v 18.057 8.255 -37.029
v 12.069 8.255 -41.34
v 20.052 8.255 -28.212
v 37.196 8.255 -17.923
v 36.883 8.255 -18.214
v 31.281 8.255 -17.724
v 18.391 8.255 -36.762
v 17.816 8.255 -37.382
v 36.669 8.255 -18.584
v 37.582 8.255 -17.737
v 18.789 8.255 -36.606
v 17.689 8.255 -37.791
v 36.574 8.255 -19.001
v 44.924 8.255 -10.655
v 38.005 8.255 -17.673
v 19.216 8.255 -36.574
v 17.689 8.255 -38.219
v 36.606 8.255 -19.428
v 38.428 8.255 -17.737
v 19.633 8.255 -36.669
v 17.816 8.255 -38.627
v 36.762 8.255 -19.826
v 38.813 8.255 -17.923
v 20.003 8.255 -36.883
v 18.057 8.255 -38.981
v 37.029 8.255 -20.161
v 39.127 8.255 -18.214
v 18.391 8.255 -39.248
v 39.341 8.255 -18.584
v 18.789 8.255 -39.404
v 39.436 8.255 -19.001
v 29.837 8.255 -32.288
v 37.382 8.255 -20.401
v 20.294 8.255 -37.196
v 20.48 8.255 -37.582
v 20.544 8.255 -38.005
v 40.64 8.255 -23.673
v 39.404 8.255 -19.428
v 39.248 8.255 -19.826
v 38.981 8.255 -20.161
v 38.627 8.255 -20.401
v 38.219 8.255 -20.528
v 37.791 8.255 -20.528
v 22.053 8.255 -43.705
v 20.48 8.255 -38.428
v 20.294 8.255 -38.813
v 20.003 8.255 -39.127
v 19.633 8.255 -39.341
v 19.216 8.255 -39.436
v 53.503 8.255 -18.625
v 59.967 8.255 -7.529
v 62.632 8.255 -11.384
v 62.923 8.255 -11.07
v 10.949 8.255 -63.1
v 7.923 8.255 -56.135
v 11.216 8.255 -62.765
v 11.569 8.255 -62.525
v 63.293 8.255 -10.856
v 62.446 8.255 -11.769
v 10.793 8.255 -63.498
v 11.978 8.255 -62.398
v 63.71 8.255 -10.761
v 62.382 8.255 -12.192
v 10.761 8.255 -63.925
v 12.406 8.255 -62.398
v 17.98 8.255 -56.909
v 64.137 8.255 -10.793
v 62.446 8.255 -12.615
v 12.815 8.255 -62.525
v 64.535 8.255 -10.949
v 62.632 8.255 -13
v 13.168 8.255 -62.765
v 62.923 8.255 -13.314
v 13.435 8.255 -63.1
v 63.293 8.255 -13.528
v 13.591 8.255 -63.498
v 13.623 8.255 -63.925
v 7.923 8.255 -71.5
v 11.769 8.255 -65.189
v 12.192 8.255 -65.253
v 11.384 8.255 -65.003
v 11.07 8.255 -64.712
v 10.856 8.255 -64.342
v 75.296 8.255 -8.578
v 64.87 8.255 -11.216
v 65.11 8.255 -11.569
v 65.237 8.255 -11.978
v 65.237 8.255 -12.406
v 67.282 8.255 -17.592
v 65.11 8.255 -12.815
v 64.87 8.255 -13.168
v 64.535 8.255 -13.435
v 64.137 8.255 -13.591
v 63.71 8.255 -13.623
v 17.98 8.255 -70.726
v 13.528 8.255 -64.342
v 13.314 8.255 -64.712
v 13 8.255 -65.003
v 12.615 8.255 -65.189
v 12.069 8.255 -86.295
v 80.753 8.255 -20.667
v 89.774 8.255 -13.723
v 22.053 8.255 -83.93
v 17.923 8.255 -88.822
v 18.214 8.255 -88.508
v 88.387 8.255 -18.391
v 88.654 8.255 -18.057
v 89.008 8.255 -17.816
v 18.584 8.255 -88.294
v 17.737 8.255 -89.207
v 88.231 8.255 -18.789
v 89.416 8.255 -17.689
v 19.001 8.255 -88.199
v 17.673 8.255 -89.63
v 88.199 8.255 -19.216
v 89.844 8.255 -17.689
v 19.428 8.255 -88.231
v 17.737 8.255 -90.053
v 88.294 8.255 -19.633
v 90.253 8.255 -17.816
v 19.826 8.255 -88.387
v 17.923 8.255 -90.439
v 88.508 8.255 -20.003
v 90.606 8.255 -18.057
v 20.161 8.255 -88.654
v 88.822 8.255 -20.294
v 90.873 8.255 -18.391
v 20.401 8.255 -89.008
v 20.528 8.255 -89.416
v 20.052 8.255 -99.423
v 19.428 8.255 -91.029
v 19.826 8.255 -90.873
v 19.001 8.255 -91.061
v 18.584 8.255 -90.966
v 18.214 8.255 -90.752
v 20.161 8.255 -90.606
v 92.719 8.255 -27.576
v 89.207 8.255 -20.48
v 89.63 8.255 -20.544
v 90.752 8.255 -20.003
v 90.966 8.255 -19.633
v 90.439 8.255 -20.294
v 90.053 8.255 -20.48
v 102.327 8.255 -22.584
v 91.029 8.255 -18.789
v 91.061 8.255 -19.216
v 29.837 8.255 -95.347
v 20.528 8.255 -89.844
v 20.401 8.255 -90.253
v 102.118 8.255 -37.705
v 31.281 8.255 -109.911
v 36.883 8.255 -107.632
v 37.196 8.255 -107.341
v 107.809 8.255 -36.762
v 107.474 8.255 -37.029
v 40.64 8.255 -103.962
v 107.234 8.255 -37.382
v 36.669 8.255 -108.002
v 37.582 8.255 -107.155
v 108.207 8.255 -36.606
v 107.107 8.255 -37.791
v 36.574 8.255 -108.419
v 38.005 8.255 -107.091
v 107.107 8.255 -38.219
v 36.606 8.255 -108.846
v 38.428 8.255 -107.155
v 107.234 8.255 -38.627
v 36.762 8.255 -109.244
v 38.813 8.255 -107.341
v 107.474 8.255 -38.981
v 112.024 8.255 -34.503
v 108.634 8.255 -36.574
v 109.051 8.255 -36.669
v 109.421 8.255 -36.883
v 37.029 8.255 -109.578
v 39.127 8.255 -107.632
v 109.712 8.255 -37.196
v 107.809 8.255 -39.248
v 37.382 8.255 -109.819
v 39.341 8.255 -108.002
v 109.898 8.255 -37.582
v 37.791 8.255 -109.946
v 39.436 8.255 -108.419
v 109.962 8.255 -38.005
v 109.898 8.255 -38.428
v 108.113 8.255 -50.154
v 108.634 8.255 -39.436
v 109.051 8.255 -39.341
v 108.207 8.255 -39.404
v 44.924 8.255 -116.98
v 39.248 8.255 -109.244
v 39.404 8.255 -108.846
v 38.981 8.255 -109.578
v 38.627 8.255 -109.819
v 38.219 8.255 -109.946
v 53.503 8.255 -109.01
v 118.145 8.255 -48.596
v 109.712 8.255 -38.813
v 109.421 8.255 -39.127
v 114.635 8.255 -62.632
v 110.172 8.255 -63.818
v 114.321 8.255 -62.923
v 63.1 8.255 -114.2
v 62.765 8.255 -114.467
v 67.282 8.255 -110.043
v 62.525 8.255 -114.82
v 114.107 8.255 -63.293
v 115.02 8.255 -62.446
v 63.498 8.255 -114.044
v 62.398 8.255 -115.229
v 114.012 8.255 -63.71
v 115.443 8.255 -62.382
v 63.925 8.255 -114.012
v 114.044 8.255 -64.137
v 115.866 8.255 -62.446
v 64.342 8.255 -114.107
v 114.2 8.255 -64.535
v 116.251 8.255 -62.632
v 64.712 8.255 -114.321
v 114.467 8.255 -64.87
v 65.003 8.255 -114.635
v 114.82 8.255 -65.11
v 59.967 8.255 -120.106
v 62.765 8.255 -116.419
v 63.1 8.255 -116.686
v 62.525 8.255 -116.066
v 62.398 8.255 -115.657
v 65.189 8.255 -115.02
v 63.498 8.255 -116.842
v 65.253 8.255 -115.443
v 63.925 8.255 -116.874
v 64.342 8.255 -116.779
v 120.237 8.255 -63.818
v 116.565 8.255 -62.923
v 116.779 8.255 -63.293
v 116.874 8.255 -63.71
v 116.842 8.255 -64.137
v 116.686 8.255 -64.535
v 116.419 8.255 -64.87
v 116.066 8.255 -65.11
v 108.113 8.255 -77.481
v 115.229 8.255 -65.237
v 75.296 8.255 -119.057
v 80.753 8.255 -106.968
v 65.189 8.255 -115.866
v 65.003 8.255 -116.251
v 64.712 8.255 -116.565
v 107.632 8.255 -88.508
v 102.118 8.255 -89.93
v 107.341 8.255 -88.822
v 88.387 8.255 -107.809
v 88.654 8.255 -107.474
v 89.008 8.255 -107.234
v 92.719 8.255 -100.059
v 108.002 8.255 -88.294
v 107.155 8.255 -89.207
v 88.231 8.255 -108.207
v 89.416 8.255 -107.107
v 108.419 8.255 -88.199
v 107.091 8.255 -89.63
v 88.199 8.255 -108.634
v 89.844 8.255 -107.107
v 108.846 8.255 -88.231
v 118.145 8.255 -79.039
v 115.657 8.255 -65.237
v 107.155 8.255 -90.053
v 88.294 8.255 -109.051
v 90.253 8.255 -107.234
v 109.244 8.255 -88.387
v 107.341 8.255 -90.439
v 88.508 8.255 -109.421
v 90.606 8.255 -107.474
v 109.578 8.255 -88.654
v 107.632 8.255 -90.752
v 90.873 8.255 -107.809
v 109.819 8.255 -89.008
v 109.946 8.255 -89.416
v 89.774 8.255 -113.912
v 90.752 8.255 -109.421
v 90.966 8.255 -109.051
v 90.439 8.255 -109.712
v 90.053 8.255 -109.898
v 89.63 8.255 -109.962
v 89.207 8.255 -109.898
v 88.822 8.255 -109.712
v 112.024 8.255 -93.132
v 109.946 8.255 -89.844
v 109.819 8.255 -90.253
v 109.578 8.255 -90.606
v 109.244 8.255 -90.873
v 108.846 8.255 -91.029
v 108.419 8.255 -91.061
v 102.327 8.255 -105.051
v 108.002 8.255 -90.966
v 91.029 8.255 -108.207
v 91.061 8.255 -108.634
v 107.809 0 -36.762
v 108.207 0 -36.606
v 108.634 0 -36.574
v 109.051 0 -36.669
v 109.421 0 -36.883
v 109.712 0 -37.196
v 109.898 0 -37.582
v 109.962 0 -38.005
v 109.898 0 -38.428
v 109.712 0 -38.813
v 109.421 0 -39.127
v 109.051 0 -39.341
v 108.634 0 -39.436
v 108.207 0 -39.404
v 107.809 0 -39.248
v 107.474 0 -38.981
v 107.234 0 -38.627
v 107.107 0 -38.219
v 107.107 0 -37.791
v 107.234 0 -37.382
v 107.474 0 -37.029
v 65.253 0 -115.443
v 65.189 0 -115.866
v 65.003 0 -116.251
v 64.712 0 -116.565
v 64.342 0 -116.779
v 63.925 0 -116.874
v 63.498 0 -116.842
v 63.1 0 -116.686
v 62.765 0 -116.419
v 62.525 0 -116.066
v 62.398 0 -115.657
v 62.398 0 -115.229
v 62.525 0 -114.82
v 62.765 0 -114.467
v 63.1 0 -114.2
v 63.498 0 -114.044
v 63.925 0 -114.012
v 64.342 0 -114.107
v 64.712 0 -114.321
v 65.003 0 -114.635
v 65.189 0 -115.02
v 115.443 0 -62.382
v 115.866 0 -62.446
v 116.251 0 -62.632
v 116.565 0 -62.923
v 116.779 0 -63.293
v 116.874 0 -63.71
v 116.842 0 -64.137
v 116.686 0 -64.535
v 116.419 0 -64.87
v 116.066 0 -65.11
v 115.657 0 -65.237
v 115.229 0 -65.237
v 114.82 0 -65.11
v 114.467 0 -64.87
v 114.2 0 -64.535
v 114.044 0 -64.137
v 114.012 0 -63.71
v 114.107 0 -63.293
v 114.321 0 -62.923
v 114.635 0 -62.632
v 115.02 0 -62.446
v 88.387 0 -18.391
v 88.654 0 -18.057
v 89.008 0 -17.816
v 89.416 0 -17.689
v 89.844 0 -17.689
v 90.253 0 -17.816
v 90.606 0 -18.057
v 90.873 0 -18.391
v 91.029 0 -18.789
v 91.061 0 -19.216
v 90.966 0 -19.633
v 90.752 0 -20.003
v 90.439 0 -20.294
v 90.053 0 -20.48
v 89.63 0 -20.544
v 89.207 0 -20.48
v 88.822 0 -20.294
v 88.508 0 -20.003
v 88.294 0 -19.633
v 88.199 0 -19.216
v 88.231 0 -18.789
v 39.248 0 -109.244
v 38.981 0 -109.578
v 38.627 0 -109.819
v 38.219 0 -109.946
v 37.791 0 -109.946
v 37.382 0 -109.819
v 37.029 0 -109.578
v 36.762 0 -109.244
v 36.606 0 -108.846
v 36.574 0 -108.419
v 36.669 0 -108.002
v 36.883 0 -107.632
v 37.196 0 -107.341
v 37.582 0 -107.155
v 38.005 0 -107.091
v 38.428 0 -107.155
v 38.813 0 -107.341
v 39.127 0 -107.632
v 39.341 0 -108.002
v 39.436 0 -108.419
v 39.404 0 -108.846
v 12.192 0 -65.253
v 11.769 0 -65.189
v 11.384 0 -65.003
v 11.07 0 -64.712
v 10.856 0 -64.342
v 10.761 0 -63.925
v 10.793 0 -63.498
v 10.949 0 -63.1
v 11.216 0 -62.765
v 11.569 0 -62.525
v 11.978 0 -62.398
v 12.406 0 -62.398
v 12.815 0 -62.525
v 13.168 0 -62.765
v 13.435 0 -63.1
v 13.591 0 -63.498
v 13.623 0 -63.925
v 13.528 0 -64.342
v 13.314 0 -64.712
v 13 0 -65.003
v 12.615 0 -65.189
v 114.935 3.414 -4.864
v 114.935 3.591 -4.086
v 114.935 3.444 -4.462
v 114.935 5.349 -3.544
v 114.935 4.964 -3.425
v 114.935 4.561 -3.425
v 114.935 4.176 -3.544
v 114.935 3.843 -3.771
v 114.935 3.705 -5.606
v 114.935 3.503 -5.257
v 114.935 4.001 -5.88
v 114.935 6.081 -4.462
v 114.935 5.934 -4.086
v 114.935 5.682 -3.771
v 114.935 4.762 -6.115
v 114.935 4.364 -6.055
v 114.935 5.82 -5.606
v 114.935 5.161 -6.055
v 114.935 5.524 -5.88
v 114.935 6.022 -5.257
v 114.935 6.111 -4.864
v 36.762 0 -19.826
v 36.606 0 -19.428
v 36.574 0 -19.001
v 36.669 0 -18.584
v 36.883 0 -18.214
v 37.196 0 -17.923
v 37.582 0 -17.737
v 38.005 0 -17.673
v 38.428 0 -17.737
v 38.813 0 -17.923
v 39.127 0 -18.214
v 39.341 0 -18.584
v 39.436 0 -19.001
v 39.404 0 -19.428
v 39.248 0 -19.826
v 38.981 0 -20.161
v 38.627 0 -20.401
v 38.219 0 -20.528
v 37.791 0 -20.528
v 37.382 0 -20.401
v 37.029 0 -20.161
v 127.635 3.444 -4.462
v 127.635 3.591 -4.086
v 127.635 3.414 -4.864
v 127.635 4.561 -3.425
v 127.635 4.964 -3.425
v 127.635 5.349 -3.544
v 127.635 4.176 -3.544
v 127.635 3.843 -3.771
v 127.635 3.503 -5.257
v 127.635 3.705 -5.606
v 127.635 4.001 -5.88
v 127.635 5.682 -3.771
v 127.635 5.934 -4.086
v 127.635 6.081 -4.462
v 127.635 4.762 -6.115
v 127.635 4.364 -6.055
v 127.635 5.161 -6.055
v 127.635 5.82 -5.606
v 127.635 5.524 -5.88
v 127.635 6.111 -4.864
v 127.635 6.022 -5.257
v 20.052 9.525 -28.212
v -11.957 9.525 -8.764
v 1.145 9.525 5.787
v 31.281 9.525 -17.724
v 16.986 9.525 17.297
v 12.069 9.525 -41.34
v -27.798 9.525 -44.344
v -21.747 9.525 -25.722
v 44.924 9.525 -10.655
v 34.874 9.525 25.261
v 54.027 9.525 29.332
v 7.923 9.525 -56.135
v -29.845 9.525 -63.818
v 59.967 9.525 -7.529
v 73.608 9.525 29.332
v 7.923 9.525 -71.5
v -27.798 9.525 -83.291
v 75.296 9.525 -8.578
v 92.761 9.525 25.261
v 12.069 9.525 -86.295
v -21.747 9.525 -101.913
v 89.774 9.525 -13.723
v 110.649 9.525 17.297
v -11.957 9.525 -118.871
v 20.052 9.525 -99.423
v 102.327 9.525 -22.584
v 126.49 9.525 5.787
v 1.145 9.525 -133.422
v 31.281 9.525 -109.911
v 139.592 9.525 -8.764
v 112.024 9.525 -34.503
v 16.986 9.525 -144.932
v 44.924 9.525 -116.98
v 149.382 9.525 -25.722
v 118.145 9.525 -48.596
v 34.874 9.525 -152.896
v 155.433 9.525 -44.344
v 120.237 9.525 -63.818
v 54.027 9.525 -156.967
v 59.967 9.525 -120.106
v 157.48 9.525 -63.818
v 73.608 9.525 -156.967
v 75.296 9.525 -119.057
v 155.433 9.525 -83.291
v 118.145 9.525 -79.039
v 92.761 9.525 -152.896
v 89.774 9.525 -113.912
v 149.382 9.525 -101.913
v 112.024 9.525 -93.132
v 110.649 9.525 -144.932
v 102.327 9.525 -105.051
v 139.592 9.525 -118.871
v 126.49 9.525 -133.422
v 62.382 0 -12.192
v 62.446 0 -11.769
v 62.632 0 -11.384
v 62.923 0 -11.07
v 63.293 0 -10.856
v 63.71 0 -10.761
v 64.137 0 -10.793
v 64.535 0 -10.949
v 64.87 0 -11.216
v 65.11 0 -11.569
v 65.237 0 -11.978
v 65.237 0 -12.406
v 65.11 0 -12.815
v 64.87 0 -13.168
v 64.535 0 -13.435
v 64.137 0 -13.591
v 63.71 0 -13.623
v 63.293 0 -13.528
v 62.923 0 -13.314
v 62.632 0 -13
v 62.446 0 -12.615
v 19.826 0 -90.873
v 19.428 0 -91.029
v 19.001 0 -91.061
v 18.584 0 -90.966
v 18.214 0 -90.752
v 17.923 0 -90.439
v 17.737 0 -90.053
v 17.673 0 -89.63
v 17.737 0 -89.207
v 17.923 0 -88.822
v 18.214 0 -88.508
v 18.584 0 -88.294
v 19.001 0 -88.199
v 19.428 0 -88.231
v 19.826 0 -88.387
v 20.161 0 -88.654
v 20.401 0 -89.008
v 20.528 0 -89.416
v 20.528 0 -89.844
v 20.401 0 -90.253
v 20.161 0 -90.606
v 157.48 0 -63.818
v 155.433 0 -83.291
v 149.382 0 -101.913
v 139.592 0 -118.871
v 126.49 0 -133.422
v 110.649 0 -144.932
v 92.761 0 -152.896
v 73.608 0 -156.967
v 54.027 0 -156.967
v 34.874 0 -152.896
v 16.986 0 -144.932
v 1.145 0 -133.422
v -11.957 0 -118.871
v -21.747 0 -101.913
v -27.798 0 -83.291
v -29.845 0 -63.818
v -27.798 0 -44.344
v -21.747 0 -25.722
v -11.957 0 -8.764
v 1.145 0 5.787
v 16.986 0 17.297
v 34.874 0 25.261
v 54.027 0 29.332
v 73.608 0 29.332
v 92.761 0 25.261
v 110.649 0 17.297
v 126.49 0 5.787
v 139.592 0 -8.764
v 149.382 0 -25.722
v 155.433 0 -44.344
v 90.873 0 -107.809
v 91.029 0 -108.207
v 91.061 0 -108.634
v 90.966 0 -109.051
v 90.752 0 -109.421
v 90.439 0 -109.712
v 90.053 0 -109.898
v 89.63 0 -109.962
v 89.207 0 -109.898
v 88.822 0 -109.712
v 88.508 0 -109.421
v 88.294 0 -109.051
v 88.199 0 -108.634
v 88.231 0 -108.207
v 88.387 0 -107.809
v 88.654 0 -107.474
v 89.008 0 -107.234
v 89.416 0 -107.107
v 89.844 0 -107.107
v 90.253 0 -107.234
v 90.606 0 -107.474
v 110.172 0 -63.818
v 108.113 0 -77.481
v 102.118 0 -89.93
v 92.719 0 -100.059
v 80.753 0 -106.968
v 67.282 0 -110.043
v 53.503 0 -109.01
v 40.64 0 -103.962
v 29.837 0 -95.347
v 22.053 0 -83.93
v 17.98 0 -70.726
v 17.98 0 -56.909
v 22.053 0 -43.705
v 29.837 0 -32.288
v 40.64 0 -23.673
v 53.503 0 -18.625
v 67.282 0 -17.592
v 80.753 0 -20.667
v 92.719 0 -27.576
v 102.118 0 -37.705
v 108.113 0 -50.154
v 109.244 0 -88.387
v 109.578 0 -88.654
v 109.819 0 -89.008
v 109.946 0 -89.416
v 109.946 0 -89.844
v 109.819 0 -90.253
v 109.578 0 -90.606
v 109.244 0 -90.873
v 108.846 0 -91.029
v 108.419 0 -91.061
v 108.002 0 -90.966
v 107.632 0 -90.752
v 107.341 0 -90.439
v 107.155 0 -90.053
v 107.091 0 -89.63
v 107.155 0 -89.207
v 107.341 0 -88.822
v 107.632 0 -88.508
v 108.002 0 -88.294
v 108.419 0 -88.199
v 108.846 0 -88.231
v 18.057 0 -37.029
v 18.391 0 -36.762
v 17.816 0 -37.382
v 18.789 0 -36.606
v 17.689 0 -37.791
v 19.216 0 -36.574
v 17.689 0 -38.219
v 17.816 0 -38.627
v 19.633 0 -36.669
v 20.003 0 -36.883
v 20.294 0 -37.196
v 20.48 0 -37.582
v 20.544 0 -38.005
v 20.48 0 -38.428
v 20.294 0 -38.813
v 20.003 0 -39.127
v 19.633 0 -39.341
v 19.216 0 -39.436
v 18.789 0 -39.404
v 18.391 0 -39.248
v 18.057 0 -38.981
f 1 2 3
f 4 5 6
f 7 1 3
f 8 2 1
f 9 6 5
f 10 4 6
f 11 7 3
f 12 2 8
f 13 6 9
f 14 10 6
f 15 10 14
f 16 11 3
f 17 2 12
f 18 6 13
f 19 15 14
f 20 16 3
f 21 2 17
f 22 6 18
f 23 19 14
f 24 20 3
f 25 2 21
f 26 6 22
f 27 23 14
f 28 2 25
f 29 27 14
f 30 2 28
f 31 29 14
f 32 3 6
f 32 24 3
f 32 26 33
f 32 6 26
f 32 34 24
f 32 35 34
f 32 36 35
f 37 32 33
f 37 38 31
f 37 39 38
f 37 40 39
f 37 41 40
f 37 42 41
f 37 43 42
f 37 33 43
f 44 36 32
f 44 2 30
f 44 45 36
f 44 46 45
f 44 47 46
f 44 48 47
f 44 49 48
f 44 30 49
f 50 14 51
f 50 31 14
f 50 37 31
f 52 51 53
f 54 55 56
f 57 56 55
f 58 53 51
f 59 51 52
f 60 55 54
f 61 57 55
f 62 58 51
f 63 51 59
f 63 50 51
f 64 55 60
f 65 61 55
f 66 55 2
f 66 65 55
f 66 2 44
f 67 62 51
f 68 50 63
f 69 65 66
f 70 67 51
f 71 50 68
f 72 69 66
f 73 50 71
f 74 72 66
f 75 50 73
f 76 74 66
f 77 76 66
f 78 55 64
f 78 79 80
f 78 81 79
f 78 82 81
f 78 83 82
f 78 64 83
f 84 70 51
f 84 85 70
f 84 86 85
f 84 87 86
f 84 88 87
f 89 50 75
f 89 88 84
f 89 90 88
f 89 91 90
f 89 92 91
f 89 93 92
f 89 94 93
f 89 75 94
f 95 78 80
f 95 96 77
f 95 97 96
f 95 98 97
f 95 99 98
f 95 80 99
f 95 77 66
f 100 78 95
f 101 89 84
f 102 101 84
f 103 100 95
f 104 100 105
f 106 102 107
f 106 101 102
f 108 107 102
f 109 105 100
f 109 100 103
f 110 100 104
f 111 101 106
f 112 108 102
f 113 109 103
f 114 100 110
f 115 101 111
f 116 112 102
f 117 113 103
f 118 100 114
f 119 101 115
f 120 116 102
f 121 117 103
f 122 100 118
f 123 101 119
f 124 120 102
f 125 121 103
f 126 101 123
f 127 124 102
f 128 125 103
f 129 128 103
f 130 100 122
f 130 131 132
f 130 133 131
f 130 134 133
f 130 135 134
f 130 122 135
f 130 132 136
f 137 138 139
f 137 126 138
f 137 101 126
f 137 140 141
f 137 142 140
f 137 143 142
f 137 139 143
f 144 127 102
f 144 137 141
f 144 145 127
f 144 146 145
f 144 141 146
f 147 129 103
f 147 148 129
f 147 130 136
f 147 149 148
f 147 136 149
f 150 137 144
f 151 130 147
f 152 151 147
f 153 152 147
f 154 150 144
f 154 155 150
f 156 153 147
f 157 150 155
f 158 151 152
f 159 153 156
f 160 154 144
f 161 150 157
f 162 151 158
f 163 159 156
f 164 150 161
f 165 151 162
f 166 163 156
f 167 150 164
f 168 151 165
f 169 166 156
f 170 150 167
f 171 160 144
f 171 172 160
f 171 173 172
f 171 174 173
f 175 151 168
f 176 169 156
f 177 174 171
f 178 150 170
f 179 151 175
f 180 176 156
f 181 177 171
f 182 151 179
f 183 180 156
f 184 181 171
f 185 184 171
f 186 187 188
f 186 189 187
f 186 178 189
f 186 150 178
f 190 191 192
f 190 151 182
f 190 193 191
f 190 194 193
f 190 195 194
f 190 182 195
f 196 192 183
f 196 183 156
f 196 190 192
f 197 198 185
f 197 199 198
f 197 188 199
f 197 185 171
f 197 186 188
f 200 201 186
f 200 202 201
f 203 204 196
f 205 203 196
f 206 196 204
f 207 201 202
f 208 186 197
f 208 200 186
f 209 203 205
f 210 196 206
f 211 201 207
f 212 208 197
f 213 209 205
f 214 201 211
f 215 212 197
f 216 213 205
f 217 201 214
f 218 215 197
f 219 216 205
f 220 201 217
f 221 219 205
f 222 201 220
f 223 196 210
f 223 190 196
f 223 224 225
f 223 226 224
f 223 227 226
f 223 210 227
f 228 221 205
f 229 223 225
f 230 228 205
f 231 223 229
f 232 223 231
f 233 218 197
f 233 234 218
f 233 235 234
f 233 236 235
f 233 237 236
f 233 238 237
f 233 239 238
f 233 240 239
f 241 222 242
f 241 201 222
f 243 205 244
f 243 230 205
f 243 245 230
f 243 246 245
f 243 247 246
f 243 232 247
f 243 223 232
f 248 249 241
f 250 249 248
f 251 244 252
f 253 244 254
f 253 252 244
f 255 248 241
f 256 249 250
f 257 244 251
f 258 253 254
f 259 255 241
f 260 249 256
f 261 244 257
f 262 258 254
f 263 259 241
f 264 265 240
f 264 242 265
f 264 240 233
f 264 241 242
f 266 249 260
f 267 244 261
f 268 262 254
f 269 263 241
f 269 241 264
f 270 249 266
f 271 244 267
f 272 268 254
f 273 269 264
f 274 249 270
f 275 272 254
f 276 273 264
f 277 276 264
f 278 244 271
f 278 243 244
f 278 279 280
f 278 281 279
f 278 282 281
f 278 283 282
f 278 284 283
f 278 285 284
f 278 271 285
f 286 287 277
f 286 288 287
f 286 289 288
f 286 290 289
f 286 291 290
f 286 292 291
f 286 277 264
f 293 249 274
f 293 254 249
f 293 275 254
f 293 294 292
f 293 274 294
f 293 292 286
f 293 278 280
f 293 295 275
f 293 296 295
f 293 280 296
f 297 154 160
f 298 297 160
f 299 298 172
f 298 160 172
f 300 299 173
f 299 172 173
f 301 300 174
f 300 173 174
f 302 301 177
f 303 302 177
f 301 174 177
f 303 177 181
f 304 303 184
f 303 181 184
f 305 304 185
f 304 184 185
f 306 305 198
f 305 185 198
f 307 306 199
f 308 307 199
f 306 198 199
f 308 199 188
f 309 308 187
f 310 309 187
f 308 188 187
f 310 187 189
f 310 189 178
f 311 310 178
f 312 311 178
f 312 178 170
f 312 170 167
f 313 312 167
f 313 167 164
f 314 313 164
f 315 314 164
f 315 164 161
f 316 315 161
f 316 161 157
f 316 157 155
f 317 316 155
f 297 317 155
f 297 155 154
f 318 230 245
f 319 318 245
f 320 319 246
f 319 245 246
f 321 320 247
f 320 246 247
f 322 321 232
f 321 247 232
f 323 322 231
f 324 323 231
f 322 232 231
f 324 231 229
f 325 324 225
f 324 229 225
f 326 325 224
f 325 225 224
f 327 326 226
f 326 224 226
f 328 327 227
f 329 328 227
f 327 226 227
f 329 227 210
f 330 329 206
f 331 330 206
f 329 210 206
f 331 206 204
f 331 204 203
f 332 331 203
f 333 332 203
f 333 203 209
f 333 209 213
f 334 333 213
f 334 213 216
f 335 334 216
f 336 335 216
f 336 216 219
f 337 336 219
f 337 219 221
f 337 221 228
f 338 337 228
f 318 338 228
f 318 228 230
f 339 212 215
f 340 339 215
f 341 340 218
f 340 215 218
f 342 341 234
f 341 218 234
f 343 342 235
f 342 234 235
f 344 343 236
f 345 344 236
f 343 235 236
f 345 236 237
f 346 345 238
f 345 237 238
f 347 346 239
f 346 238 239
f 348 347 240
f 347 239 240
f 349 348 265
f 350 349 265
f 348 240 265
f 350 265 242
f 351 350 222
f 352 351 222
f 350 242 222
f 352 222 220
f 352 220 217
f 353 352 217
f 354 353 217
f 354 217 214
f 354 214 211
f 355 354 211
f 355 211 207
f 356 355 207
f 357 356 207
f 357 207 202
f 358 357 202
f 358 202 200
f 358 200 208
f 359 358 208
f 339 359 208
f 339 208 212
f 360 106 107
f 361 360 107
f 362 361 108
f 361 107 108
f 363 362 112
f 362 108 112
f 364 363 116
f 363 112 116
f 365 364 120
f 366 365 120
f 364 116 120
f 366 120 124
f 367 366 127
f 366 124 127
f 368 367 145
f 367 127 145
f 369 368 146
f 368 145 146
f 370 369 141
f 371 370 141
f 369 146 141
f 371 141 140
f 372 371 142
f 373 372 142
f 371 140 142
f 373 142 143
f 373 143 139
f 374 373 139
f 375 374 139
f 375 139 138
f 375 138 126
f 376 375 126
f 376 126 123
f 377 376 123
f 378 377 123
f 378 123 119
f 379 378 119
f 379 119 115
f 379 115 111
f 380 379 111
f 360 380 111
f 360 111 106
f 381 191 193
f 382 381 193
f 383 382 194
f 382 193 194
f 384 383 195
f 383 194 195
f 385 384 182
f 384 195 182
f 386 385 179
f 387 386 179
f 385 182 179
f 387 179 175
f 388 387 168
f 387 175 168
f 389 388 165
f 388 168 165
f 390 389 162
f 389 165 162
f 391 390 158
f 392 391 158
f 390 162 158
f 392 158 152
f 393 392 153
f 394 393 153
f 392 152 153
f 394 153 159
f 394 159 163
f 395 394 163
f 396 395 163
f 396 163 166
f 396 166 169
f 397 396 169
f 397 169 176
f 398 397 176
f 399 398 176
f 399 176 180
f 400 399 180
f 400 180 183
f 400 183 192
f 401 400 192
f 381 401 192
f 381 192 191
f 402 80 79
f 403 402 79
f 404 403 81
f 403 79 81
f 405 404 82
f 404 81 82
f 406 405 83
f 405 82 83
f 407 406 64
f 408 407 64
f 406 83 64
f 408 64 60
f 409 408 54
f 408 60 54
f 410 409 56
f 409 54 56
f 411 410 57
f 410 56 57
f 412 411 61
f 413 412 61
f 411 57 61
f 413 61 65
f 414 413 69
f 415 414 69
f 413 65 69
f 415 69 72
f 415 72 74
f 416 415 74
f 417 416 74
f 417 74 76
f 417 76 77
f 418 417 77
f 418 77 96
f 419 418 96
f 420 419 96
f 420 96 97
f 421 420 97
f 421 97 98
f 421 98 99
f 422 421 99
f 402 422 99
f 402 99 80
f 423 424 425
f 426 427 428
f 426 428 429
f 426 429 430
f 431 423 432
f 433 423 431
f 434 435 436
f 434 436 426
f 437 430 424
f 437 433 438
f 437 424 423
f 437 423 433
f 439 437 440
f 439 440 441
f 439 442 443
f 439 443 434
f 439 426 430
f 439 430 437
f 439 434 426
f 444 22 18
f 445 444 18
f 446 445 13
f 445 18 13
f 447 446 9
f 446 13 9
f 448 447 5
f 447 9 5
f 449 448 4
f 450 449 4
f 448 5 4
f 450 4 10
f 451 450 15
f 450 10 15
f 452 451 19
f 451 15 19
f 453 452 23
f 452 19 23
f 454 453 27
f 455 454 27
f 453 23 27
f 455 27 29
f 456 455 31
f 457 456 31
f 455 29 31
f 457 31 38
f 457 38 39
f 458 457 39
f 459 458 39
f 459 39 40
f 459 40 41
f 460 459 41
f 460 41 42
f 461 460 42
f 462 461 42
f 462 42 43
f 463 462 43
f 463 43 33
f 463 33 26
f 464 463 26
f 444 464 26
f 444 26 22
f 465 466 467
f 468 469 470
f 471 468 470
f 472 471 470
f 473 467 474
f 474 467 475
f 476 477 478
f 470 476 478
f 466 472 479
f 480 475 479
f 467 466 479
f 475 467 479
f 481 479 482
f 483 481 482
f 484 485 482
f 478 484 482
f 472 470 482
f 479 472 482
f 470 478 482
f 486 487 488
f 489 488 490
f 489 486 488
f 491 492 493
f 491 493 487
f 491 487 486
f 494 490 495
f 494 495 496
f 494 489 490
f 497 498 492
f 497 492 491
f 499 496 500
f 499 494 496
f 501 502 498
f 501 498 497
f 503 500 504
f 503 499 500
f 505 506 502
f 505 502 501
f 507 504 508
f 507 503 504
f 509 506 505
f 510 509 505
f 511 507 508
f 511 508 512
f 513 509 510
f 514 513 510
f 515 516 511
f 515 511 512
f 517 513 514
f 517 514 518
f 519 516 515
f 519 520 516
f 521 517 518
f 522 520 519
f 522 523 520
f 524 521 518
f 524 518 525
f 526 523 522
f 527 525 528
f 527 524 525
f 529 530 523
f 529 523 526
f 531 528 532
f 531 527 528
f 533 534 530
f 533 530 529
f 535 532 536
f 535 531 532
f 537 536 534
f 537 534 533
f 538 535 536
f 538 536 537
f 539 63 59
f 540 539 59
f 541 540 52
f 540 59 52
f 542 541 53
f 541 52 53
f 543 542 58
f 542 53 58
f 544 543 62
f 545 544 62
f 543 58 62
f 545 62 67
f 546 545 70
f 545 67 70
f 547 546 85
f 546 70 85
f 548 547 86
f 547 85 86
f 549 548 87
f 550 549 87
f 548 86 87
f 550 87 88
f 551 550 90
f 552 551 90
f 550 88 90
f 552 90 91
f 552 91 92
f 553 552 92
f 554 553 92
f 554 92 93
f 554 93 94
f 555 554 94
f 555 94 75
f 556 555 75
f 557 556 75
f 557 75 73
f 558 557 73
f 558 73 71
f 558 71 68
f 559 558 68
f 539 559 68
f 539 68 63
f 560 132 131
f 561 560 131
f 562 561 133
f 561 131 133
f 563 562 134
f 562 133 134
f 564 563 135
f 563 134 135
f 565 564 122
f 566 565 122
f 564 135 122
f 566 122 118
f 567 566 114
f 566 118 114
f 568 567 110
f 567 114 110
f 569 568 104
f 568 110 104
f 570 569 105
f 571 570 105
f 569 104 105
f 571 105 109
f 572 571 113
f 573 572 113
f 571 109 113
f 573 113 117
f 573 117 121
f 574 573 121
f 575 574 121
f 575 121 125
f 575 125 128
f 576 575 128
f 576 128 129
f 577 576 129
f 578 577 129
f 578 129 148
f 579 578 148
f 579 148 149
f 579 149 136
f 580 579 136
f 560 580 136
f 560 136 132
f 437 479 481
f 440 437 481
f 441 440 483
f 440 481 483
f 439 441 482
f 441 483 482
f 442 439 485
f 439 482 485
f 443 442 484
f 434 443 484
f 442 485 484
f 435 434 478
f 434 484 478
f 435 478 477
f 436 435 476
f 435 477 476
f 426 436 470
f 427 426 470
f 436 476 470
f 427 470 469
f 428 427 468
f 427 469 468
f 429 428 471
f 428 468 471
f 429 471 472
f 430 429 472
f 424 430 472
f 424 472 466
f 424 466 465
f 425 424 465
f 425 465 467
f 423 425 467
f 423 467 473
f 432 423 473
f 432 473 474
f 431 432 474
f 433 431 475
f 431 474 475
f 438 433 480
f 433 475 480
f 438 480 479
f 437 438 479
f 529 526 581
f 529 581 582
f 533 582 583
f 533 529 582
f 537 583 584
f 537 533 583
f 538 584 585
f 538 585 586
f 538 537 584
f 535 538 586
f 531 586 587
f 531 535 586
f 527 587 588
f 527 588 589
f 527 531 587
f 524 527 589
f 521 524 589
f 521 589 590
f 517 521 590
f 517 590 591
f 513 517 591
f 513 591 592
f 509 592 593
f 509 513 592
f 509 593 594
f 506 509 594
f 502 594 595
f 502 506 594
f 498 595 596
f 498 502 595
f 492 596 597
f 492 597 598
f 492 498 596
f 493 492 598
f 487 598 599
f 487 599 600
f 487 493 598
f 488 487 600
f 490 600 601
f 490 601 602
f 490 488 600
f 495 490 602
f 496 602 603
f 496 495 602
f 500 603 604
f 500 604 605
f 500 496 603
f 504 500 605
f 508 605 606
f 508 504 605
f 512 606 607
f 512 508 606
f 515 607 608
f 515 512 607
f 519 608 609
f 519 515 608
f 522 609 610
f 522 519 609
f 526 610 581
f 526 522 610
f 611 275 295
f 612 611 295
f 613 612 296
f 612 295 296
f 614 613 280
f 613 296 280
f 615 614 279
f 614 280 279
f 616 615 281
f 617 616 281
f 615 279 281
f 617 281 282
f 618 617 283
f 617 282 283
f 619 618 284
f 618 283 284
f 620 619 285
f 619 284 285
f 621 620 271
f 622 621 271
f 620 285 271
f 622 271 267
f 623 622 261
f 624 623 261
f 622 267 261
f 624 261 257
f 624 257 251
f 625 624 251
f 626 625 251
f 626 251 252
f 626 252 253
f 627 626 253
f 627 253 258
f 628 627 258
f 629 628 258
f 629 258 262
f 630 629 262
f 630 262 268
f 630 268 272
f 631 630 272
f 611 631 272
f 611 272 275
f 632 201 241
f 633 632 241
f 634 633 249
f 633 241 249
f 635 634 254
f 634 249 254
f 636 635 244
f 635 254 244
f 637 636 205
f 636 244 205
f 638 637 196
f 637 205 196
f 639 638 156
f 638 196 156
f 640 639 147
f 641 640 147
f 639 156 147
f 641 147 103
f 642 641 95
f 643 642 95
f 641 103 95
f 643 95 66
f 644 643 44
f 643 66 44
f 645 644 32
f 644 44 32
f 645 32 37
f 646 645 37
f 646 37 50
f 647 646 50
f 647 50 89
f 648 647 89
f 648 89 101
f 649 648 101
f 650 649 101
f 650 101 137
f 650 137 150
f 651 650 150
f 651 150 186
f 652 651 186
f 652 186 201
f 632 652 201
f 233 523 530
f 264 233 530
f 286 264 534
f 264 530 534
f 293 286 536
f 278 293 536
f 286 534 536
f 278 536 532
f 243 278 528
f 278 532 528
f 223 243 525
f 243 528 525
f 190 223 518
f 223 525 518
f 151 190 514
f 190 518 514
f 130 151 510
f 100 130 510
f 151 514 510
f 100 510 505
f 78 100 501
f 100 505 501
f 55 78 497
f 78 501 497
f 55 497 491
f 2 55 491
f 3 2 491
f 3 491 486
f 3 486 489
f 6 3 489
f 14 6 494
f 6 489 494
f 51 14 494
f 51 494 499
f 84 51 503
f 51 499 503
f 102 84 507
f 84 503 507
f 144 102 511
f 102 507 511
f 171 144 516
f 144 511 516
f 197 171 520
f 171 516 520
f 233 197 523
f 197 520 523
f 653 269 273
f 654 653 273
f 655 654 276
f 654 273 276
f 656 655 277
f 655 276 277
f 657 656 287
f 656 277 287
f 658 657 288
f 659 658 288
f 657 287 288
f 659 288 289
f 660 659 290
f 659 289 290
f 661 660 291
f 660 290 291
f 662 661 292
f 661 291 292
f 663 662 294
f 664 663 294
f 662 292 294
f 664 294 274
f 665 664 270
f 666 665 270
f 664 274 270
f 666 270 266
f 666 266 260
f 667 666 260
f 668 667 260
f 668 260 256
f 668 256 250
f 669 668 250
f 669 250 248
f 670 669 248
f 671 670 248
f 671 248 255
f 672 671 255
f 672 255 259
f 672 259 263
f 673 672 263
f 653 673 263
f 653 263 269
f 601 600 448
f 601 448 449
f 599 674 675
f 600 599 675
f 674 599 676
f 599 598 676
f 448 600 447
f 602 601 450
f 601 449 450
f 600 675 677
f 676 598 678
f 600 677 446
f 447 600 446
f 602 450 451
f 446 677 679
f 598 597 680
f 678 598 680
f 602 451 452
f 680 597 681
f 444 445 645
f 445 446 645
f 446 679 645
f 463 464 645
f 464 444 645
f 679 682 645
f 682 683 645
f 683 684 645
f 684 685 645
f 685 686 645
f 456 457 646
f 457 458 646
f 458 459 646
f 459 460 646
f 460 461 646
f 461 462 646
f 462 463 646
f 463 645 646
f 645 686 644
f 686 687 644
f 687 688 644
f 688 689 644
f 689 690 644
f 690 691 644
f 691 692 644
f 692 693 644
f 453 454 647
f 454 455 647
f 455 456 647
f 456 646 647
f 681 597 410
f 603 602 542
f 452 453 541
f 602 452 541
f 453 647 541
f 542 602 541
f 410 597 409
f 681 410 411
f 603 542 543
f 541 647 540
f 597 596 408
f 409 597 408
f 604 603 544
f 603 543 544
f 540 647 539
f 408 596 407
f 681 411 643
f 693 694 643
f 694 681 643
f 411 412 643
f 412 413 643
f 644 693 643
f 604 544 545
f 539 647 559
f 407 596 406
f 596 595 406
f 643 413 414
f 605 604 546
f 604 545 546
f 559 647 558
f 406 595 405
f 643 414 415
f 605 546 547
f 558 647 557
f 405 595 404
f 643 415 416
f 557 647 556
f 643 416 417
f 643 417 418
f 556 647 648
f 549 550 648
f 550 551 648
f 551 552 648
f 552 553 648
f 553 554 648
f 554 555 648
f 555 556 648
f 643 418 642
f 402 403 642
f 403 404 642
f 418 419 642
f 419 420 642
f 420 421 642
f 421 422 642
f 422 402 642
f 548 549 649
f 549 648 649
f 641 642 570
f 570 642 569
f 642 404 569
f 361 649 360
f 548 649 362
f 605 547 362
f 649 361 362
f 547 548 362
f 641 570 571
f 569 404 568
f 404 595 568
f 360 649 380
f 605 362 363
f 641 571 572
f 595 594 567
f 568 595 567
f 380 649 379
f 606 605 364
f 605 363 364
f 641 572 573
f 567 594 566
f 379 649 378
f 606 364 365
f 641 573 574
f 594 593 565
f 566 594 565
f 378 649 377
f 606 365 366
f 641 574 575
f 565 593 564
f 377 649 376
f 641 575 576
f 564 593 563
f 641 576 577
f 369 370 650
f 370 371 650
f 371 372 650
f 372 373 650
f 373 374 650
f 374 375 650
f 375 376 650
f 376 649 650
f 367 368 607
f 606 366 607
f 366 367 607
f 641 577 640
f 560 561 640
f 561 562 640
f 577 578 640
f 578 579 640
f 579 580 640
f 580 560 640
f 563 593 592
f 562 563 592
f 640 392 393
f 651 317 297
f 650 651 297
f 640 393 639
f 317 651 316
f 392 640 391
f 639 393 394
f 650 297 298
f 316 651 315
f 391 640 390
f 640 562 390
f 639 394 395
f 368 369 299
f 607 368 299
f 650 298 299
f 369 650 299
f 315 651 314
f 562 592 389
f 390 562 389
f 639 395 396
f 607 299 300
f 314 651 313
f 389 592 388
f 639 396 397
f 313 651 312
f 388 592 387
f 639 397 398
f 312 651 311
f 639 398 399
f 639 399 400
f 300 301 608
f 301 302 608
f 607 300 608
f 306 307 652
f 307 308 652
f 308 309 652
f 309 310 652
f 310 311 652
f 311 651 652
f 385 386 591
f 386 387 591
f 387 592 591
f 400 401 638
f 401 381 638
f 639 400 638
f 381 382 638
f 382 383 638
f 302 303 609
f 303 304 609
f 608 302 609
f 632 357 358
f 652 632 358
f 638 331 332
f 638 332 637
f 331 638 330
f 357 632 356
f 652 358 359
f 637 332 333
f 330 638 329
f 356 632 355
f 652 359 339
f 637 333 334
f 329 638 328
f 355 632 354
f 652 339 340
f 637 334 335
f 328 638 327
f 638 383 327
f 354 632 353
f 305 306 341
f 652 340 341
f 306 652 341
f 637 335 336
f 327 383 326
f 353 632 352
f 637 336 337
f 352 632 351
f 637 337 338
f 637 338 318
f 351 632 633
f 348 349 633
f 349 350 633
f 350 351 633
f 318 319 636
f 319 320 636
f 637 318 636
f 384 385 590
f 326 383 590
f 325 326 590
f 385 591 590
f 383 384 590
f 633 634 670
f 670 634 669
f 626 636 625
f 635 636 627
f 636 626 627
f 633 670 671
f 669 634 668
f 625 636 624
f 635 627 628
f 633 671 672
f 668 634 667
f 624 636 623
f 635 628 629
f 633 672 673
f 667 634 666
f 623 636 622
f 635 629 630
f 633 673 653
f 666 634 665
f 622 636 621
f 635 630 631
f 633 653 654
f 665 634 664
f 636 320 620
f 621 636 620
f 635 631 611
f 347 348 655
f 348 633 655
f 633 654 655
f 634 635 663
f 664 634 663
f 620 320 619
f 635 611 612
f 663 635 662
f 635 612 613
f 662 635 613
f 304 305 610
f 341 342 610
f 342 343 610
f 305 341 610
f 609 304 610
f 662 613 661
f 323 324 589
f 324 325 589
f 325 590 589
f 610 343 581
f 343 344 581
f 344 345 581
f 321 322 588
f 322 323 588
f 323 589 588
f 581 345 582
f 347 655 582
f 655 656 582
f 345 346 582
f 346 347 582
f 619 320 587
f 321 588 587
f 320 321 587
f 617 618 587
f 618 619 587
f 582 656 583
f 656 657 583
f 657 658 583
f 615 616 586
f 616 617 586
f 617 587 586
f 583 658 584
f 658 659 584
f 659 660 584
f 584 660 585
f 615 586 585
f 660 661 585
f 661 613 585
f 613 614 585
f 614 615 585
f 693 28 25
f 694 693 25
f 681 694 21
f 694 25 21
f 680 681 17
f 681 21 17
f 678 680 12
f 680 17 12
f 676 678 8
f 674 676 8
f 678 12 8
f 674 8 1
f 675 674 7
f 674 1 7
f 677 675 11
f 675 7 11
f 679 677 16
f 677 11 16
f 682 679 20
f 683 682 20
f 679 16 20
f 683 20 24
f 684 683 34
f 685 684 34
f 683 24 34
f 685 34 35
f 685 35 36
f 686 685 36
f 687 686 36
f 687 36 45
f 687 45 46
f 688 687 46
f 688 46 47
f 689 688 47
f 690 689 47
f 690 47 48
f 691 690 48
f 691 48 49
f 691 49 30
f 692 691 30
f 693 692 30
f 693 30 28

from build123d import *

# Parameters (mm, degrees)
SKETCH1_W           = 127.635
SKETCH1_H           = 127.635
BOSS_EXTRUDE1_DEPTH = 9.525
SKETCH13_R          = 93.6625
BOSS_EXTRUDE2_DEPTH = 9.525
SKETCH6_R           = 1.35255
F_6_32_HOLE1_DEPTH  = 12.7
SKETCH5_R           = 46.355
CUT_EXTRUDE1_DEPTH  = 9.525
SKETCH11_R          = 1.4351
CUT_EXTRUDE3_DEPTH  = 10.525
CIRPATTERN1_COUNT   = 12
SKETCH12_R          = 56.41975
CUT_EXTRUDE4_DEPTH  = 1.27


with BuildPart() as part:
    # Sketch1 → Boss-Extrude1 (new body)
    with BuildSketch(Plane(origin=(0, 0, 0), x_dir=(1, 0, 0), z_dir=(0, 1, 0))):
        with Locations((63.8175, 63.8175)):
            Rectangle(SKETCH1_W, SKETCH1_H)
    extrude(amount=BOSS_EXTRUDE1_DEPTH)

    # Sketch13 → Boss-Extrude2 (add)
    with BuildSketch(Plane(origin=(0, 9.525, 0), x_dir=(1, 0, 0), z_dir=(0, 1, 0))):
        with Locations((63.8175, 63.8175)):
            Circle(SKETCH13_R)
    extrude(amount=-BOSS_EXTRUDE2_DEPTH)

    # Sketch6 → 6-32 hole1 (cut)
    with BuildSketch(Plane(origin=(127.635, 0, 0), x_dir=(0, 0, -1), z_dir=(1, 0, 0))):
        with Locations((4.7625, 4.7625)):
            Circle(SKETCH6_R)
    extrude(amount=-F_6_32_HOLE1_DEPTH, mode=Mode.SUBTRACT)

    # Sketch5 → Cut-Extrude1 (cut)
    with BuildSketch(Plane(origin=(0, 9.525, 0), x_dir=(1, 0, 0), z_dir=(0, 1, 0))):
        with Locations((63.8175, 63.8175)):
            Circle(SKETCH5_R)
    extrude(amount=-CUT_EXTRUDE1_DEPTH, mode=Mode.SUBTRACT)

    # Sketch11 → Cut-Extrude3 (cut, through all)
    with BuildSketch(Plane(origin=(0, 9.525, 0), x_dir=(1, 0, 0), z_dir=(0, 1, 0))):
        with Locations((63.8175, 115.443)):
            Circle(SKETCH11_R)
    cut_extrude3 = extrude(amount=-CUT_EXTRUDE3_DEPTH, mode=Mode.SUBTRACT)

    # CirPattern1: Cut-Extrude3 ×12 about axis
    cirpattern1_axis = Axis((63.8175, 0, -63.8175), (0, 1, 0))
    for i in range(1, CIRPATTERN1_COUNT):
        add(cut_extrude3.rotate(cirpattern1_axis, i * 360 / CIRPATTERN1_COUNT), mode=Mode.SUBTRACT)

    # Sketch12 → Cut-Extrude4 (cut)
    with BuildSketch(Plane(origin=(0, 9.525, 0), x_dir=(1, 0, 0), z_dir=(0, 1, 0))):
        with Locations((63.8175, 63.8175)):
            Circle(SKETCH12_R)
    extrude(amount=-CUT_EXTRUDE4_DEPTH, mode=Mode.SUBTRACT)


solid = part.part
